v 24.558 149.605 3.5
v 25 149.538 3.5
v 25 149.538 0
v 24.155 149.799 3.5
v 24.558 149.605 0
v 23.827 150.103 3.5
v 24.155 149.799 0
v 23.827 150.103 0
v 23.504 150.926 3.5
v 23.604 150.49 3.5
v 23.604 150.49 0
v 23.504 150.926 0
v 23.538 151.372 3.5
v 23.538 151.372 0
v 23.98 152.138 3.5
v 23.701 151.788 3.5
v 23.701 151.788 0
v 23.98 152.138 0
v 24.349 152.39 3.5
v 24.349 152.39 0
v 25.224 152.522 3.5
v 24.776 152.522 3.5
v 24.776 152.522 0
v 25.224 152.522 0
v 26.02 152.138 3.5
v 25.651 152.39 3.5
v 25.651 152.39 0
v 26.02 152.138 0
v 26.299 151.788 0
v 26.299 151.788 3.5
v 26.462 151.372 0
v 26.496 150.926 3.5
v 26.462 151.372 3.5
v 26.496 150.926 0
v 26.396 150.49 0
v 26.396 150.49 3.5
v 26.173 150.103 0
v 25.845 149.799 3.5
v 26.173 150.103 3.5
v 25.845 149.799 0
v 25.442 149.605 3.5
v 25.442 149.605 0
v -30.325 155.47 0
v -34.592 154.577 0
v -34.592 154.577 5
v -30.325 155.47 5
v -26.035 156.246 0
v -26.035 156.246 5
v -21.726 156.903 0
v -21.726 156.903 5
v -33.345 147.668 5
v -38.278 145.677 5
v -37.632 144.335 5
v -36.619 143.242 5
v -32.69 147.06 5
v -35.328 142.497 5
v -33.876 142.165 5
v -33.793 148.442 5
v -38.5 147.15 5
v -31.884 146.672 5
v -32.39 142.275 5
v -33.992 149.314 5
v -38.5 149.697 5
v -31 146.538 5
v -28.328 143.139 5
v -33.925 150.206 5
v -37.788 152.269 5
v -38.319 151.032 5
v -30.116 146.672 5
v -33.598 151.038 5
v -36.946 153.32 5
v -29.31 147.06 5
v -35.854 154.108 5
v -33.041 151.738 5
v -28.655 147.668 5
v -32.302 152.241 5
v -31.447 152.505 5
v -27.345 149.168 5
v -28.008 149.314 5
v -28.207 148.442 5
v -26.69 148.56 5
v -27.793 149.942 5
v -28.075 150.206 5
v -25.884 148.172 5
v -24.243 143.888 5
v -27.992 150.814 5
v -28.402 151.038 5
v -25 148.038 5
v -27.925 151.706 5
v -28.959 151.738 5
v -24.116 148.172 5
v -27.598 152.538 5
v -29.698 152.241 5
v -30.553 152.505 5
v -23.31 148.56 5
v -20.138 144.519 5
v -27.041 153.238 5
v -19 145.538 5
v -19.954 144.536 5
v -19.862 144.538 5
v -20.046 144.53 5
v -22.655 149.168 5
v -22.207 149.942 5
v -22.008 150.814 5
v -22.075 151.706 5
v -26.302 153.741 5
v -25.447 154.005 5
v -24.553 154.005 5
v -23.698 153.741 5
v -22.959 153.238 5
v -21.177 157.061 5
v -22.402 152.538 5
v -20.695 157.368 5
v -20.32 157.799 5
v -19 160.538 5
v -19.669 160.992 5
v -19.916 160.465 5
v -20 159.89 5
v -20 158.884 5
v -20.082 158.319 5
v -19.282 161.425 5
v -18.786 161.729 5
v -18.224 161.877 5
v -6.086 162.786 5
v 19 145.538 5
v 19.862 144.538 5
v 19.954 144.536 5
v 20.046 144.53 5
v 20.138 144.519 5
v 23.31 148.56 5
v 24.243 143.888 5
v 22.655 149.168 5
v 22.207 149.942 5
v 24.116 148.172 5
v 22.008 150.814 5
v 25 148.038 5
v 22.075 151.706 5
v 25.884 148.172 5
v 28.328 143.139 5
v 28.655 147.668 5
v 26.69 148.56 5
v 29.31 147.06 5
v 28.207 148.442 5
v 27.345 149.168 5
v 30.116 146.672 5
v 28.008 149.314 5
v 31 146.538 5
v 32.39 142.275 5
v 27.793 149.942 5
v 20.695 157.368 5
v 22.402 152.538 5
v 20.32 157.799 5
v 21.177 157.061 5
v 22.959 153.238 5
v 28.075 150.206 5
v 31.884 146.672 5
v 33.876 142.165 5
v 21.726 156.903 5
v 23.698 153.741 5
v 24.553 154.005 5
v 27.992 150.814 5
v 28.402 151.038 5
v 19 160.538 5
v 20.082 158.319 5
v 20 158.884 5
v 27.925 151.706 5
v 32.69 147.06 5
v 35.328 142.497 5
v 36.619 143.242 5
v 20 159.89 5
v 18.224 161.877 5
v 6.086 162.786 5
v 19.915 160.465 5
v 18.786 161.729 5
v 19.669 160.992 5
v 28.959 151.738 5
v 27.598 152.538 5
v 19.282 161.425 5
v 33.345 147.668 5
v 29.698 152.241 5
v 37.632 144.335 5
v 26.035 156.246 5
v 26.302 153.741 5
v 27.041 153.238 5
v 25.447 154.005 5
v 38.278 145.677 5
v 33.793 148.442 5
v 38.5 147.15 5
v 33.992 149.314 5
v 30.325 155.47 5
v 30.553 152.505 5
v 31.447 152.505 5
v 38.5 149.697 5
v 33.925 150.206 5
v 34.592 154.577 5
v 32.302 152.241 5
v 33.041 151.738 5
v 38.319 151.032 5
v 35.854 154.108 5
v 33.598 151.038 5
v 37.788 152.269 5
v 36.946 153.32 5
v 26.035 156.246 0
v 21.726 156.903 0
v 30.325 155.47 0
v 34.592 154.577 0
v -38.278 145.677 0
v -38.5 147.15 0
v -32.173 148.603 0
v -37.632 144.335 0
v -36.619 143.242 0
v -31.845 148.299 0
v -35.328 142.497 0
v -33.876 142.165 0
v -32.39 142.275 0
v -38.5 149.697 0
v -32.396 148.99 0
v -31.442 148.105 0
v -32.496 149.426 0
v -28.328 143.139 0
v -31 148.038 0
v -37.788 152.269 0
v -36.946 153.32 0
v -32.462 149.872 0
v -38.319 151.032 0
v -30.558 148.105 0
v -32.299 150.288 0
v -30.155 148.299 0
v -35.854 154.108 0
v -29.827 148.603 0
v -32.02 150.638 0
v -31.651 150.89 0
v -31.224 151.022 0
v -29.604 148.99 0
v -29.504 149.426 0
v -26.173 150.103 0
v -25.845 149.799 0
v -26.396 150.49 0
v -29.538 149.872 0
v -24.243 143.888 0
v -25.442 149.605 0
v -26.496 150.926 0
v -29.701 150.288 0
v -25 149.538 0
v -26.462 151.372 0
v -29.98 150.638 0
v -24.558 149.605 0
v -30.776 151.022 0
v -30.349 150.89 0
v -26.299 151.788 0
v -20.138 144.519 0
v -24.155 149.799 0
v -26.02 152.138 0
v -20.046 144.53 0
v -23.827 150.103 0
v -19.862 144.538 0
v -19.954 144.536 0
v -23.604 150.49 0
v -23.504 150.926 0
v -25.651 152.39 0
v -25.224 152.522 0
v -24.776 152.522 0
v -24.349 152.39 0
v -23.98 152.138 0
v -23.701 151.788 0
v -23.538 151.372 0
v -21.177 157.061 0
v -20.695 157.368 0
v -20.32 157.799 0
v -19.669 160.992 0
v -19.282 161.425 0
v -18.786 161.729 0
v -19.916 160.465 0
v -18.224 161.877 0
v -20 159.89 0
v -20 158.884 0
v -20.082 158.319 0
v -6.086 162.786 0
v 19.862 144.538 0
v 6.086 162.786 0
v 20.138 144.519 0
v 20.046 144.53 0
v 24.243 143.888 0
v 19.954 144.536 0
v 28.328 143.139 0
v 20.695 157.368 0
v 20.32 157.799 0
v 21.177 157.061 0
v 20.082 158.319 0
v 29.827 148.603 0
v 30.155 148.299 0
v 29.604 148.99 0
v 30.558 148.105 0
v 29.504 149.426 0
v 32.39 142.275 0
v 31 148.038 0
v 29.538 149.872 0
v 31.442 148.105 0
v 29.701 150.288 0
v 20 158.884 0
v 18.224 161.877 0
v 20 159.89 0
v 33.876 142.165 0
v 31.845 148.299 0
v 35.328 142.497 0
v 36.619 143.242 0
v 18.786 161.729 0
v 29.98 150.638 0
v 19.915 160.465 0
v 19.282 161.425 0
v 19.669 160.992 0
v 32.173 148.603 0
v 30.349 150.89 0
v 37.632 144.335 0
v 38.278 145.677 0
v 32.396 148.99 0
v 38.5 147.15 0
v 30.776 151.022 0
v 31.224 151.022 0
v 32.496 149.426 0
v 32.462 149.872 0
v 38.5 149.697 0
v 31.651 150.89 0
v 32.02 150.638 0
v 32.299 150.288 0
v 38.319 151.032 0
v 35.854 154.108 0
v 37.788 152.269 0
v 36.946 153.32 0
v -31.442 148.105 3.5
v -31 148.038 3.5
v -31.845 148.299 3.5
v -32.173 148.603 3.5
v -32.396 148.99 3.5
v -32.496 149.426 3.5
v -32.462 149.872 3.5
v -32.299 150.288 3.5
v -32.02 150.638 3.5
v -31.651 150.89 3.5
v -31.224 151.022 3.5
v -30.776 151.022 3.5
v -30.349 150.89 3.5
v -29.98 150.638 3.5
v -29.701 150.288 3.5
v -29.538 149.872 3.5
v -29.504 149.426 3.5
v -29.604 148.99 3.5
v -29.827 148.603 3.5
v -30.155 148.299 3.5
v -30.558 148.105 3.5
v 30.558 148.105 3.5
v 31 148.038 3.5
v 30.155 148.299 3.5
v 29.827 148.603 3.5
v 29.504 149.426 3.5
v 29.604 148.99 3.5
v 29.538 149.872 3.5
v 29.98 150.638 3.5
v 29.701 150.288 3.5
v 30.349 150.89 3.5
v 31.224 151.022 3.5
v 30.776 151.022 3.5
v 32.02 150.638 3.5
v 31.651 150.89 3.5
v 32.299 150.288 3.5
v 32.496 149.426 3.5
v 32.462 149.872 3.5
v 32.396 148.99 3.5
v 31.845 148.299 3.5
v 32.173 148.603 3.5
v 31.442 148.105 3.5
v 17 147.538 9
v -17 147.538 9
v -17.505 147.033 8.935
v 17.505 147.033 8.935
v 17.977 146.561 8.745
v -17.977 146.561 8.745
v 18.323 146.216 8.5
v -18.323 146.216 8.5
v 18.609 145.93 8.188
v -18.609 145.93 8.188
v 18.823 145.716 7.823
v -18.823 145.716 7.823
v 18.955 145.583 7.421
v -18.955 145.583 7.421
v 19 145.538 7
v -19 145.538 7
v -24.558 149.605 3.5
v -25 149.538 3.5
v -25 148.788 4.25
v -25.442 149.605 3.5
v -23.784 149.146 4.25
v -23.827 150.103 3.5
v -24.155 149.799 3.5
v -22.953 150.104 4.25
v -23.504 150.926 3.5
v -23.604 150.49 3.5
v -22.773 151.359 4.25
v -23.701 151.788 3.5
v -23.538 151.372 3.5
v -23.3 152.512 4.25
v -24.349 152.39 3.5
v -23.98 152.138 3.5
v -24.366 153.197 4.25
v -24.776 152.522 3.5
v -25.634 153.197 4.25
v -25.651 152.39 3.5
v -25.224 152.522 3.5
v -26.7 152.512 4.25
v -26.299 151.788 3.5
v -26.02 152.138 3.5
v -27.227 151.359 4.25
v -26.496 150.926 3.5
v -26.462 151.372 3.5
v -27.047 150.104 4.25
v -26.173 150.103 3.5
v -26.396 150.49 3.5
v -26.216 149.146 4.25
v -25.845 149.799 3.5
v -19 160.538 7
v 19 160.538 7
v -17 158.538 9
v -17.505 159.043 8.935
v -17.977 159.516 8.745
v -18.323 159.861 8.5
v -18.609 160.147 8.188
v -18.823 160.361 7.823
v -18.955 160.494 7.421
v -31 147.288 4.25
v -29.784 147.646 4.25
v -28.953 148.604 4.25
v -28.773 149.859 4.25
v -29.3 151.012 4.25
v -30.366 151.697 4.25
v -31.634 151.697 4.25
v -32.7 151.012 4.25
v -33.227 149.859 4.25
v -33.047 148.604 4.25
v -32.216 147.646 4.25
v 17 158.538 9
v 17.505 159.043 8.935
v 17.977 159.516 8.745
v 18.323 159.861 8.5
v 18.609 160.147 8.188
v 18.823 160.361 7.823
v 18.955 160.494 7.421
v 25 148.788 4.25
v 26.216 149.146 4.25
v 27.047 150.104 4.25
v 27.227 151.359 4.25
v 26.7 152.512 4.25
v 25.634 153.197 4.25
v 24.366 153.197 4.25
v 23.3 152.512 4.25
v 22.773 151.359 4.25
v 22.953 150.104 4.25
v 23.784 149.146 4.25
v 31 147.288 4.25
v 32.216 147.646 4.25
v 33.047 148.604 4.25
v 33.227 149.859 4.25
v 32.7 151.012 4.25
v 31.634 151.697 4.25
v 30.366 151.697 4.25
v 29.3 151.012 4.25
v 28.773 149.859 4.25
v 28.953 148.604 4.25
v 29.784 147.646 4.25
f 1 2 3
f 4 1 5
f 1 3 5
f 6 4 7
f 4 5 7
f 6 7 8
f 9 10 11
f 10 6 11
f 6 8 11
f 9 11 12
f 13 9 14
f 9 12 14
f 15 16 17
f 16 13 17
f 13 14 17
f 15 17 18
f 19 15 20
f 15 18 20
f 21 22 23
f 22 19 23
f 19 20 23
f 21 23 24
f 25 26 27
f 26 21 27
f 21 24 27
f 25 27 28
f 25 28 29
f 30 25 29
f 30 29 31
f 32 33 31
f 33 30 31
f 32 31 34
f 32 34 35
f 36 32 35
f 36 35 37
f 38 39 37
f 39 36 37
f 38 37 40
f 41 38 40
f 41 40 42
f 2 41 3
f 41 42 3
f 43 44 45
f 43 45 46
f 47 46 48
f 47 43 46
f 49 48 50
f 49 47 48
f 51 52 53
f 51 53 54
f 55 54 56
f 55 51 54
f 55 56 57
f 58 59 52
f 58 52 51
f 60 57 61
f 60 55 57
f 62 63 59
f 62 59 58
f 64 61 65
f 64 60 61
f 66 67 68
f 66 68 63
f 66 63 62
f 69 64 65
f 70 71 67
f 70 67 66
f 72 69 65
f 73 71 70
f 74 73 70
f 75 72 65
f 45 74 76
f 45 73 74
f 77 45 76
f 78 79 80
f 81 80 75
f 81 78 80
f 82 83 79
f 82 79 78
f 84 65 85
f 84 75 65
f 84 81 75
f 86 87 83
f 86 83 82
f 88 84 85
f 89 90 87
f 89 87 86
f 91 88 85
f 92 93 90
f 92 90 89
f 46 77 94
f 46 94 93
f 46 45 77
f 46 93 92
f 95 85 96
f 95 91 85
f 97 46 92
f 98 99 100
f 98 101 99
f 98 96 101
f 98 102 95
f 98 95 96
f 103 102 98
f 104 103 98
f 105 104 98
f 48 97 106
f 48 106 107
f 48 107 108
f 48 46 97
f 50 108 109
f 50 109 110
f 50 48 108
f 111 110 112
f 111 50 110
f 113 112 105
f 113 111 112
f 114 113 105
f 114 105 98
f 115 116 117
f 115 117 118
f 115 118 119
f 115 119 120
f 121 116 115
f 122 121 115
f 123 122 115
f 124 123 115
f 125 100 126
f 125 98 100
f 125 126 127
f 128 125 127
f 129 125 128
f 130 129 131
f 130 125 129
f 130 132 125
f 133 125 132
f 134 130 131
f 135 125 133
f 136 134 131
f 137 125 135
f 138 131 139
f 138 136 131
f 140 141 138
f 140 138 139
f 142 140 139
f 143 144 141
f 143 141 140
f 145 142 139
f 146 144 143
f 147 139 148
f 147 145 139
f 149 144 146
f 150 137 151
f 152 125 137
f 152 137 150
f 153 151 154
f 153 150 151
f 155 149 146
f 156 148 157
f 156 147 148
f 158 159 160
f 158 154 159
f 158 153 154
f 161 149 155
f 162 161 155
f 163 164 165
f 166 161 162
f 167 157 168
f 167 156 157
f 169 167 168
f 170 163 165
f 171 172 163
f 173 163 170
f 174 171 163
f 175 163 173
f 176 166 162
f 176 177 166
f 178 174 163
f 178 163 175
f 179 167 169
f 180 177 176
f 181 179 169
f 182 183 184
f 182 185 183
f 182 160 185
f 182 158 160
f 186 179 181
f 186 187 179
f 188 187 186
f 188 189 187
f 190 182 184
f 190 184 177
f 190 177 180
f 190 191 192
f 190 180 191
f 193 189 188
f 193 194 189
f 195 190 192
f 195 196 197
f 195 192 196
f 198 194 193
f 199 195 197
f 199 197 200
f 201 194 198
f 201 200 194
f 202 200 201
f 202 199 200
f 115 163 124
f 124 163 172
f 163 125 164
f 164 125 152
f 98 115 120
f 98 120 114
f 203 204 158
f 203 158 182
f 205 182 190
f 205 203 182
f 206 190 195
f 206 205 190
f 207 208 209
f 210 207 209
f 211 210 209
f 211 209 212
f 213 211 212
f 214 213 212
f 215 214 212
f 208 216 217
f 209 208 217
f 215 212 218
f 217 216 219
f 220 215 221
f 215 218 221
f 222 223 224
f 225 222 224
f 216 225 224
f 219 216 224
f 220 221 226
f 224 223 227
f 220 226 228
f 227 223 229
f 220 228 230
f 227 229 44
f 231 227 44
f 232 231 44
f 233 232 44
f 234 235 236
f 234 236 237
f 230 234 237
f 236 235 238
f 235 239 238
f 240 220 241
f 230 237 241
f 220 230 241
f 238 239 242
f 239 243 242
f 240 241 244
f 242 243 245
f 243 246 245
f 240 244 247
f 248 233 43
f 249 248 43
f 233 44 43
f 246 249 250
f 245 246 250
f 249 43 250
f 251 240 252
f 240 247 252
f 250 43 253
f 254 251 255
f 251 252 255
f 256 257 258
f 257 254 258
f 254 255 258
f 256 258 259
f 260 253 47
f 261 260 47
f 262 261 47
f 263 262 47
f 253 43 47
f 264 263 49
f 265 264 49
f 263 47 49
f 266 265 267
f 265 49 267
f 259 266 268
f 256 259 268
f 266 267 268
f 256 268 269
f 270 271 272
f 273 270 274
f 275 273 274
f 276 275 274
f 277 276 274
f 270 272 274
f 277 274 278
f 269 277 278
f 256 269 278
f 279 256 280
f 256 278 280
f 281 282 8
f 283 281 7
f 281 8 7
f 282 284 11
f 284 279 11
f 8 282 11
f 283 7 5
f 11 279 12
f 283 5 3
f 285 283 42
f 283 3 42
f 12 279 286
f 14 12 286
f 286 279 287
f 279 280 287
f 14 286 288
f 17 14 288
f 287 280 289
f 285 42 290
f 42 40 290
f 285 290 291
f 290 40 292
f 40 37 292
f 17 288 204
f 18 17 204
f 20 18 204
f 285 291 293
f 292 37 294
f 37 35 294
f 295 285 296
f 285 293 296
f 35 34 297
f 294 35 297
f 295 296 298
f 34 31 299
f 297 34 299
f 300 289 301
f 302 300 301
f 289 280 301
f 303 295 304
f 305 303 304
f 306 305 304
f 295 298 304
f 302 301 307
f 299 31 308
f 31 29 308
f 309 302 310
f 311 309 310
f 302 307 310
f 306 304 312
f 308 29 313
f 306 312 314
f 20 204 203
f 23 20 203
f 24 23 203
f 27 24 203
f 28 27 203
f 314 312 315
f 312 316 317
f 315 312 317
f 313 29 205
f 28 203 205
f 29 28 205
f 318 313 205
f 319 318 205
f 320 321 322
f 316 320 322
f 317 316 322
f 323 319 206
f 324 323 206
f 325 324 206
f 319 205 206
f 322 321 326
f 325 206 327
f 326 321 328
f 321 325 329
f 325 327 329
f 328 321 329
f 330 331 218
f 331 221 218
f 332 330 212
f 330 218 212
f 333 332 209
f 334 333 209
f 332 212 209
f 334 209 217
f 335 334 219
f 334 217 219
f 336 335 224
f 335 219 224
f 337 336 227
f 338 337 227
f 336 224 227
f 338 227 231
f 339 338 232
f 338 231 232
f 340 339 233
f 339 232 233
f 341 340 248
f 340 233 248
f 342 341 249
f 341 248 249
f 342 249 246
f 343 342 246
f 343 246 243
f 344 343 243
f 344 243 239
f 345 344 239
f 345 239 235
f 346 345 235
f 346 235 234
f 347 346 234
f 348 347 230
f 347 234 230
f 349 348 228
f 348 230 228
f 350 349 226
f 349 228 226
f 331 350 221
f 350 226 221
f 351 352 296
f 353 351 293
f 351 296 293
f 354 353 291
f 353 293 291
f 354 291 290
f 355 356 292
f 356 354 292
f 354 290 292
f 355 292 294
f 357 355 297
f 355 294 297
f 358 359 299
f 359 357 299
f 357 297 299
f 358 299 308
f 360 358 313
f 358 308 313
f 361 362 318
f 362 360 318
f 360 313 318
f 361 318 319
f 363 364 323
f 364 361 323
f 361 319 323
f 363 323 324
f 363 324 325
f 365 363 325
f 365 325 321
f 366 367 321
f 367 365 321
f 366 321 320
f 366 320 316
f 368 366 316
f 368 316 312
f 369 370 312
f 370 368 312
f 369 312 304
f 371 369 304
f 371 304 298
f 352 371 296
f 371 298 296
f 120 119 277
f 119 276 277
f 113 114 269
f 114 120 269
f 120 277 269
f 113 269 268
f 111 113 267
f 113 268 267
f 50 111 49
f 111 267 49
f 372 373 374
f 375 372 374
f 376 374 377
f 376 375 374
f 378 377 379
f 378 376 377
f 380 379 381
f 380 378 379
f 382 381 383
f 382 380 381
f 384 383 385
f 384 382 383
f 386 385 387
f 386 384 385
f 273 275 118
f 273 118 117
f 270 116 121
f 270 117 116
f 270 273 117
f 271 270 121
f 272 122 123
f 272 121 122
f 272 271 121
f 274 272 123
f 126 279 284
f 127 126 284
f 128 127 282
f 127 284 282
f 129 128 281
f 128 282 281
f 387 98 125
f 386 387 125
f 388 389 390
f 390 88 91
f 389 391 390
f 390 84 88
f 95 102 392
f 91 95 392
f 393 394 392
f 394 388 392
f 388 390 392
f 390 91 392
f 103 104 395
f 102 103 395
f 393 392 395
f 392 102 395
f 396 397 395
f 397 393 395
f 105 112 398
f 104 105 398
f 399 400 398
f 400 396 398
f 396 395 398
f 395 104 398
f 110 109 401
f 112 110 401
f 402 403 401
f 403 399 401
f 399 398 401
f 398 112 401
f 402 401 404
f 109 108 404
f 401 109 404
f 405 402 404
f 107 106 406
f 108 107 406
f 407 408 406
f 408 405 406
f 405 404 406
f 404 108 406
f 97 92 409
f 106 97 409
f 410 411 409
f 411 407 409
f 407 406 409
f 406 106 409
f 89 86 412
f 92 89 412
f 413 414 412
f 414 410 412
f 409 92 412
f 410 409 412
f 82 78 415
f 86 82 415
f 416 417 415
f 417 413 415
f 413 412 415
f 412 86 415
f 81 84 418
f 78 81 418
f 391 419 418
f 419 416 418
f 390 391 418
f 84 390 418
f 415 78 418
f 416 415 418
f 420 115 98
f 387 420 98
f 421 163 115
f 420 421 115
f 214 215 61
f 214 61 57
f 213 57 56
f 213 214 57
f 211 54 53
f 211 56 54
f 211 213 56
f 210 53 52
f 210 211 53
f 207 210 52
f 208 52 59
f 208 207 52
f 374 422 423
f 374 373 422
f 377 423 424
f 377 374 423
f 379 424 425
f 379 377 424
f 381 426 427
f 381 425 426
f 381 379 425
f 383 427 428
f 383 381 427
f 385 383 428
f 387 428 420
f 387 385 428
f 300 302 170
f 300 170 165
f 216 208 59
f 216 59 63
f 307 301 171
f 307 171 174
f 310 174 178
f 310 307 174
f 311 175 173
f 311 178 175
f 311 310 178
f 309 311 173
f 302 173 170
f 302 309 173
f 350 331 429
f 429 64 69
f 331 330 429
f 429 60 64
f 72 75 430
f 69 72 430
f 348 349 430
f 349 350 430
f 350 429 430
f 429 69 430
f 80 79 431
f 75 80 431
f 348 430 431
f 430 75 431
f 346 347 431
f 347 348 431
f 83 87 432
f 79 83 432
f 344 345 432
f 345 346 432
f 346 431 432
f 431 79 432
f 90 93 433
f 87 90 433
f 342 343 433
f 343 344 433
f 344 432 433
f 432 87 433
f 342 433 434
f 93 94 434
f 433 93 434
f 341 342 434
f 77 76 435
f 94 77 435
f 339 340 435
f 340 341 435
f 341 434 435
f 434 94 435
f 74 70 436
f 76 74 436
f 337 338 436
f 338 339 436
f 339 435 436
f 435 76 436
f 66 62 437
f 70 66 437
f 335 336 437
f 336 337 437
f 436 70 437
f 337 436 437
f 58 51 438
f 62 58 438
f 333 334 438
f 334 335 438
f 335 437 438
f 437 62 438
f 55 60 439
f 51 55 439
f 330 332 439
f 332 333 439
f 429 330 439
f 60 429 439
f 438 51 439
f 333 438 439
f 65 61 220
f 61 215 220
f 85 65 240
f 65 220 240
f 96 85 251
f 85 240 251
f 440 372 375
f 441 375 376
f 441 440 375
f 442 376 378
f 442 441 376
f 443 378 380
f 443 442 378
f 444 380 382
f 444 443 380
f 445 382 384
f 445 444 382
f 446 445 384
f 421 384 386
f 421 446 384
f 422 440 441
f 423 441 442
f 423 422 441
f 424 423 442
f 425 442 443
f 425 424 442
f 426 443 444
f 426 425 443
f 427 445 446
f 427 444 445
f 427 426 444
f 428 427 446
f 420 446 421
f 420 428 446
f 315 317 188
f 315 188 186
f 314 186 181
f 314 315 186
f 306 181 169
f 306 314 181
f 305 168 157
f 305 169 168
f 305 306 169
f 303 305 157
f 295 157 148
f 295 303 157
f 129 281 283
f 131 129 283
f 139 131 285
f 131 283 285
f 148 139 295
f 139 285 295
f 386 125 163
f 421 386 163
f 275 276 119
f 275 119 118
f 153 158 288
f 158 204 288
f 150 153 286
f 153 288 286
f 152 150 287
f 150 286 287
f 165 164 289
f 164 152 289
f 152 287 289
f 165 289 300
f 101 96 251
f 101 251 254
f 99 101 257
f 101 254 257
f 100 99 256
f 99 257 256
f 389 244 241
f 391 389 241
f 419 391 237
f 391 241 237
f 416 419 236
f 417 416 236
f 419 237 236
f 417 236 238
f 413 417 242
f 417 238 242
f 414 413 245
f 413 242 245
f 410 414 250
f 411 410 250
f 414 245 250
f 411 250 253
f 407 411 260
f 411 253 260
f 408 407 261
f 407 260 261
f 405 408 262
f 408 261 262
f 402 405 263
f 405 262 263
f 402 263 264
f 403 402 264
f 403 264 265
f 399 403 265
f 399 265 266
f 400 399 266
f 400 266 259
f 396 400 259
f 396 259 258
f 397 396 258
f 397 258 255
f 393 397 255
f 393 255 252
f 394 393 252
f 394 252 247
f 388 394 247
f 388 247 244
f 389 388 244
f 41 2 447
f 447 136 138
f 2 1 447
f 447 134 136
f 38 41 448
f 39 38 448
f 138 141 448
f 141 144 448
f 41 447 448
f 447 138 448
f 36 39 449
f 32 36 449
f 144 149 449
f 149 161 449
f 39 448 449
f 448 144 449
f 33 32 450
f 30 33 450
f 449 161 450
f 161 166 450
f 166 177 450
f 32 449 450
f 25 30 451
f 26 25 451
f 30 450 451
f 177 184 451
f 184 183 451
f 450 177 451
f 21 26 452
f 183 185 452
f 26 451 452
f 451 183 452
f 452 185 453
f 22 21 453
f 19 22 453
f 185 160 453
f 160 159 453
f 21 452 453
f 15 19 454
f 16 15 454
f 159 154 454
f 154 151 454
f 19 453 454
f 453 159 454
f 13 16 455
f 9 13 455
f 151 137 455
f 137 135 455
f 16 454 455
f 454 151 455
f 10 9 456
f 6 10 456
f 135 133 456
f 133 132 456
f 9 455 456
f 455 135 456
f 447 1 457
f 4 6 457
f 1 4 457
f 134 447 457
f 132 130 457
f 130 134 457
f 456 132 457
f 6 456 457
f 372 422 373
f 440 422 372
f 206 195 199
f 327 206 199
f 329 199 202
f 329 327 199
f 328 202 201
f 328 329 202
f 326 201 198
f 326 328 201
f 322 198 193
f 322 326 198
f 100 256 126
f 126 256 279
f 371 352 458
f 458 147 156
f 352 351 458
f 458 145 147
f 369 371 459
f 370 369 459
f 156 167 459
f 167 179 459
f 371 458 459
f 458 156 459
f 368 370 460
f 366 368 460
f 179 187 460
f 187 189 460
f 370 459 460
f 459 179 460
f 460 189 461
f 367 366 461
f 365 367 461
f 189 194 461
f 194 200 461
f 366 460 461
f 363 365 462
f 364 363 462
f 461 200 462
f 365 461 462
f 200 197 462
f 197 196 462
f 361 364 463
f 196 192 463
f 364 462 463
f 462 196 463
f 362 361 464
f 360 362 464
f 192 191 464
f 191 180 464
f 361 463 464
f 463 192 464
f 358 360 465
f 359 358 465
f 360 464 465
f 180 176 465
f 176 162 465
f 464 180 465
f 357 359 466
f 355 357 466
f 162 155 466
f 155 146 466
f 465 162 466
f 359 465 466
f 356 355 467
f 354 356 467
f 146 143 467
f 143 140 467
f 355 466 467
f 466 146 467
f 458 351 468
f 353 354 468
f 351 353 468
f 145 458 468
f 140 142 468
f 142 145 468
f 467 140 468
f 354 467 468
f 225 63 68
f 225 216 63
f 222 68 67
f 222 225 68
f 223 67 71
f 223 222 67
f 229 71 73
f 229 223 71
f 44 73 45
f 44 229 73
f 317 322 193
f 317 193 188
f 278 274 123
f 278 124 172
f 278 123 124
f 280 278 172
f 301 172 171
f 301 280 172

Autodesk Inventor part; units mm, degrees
ref_plane "YZ Plane" through (0, 0, 0) normal (1, 0, 0) x (0, 1, 0)
ref_plane "XZ Plane" through (0, 0, 0) normal (0, 1, 0) x (-1, 0, 0)
ref_plane "XY Plane" through (0, 0, 0) normal (0, 0, 1) x (1, 0, 0)
sketch "Sketch1" plane through (0, 0, 0) normal (0, 0, 1) x (1, 0, 0)
  arc A0 (34.5919, 154.5766) -> (21.7257, 156.9029) centre (0, 0) ccw
  line L0 (38.5, 149.6973) -> (38.5, 147.1504)
  line L1 (-38.5, 147.1504) -> (-38.5, 149.6973)
  arc A1 (18.2237, 161.8774) -> (-18.2237, 161.8774) centre (0, 0) ccw
  line L2 (20, 159.8899) -> (20, 158.884)
  line L3 (-20, 158.884) -> (-20, 159.8899)
  arc A2 (-21.7257, 156.9029) -> (-34.5919, 154.5766) centre (0, 0) ccw
  arc A3 (32.3901, 142.2751) -> (20.1378, 144.5192) centre (0, 0) ccw
  arc A4 (-20.1378, 144.5192) -> (-32.3901, 142.2751) centre (0, 0) ccw
  line L4 (-19.8618, 144.5384) -> (19.8618, 144.5384)
  arc A5 (-38.5, 147.1504) -> (-32.3901, 142.2751) centre (-33.5, 147.1504) ccw
  arc A6 (-34.5919, 154.5766) -> (-38.5, 149.6973) centre (-33.5, 149.6973) ccw
  arc A7 (32.3901, 142.2751) -> (38.5, 147.1504) centre (33.5, 147.1504) ccw
  arc A8 (38.5, 149.6973) -> (34.5919, 154.5766) centre (33.5, 149.6973) ccw
  arc A9 (-21.7257, 156.9029) -> (-20, 158.884) centre (-22, 158.884) ccw
  arc A10 (20, 158.884) -> (21.7257, 156.9029) centre (22, 158.884) ccw
  arc A11 (20, 159.8899) -> (18.2237, 161.8774) centre (18, 159.8899) ccw
  arc A12 (-18.2237, 161.8774) -> (-20, 159.8899) centre (-18, 159.8899) ccw
  arc A13 (-19.8618, 144.5384) -> (-20.1378, 144.5192) centre (-19.8618, 142.5384) ccw
  arc A14 (20.1378, 144.5192) -> (19.8618, 144.5384) centre (19.8618, 142.5384) ccw
  point P0 (38.5, 140.7448)
  point P1 (38.5, 153.6499)
  point P2 (-38.5, 140.7448)
  point P3 (-38.5, 153.6499)
  point P4 (20, 161.6675)
  point P5 (20, 144.5384)
  point P6 (-20, 144.5384)
  point P7 (-20, 161.6675)
  point P8 (-20, 157.1322)
  point P9 (20, 157.1322)
  dimension "d5" = 77
  dimension "d6" = 38.5
  dimension "d9" = 5
  dimension "d10" = 2
extrude "Extrusion1" add sketch "Sketch1" along normal blind 5
sketch "Sketch2" plane through (0, 0, 5) normal (0, 0, 1) x (1, 0, 0)
  line L0 (-19, 145.5384) -> (19, 145.5384)
  line L1 (19, 145.5384) -> (19, 160.5384)
  line L2 (19, 160.5384) -> (-19, 160.5384)
  line L3 (-19, 160.5384) -> (-19, 145.5384)
  circle A0 centre (-31, 149.5384) radius 1.5
  circle A1 centre (-25, 151.0384) radius 1.5
  line L4 (-19.8618, 144.5384) -> (19.8618, 144.5384) projected
  point P0 (0, 0)
  point P1 (0, 145.5384)
  point P2 (0, 144.5384)
  dimension "d13" = 38
  dimension "d14" = 15
  dimension "d15" = 1
  dimension "d16" = 25
  dimension "d17" = 31
  dimension "d18" = 3
  dimension "d19" = 3
  dimension "d20" = 5
  dimension "d21" = 1.5
extrude "Extrusion2" add sketch "Sketch2" along normal blind 4 contours L3 L2 L1 L0
hole "Hole1" at (-31, 149.5384, 5) at (-25, 151.0384, 5) direction (0, 0, -1) diameter 3 end through all countersink diameter 6 countersink angle 90
mirror "Mirror1" about plane through (0, 0, 0) normal (1, 0, 0) of "Hole1"
fillet "Fillet1" radius 2 4 edges at (0, 160.5384, 9) (-19, 153.0384, 9) (0, 145.5384, 9) (19, 153.0384, 9)
equation "\"d6\" = 0.5 * d5"
equation "\"d19\" = d18"
properties part number "magnet" material "Iron, Gray"
